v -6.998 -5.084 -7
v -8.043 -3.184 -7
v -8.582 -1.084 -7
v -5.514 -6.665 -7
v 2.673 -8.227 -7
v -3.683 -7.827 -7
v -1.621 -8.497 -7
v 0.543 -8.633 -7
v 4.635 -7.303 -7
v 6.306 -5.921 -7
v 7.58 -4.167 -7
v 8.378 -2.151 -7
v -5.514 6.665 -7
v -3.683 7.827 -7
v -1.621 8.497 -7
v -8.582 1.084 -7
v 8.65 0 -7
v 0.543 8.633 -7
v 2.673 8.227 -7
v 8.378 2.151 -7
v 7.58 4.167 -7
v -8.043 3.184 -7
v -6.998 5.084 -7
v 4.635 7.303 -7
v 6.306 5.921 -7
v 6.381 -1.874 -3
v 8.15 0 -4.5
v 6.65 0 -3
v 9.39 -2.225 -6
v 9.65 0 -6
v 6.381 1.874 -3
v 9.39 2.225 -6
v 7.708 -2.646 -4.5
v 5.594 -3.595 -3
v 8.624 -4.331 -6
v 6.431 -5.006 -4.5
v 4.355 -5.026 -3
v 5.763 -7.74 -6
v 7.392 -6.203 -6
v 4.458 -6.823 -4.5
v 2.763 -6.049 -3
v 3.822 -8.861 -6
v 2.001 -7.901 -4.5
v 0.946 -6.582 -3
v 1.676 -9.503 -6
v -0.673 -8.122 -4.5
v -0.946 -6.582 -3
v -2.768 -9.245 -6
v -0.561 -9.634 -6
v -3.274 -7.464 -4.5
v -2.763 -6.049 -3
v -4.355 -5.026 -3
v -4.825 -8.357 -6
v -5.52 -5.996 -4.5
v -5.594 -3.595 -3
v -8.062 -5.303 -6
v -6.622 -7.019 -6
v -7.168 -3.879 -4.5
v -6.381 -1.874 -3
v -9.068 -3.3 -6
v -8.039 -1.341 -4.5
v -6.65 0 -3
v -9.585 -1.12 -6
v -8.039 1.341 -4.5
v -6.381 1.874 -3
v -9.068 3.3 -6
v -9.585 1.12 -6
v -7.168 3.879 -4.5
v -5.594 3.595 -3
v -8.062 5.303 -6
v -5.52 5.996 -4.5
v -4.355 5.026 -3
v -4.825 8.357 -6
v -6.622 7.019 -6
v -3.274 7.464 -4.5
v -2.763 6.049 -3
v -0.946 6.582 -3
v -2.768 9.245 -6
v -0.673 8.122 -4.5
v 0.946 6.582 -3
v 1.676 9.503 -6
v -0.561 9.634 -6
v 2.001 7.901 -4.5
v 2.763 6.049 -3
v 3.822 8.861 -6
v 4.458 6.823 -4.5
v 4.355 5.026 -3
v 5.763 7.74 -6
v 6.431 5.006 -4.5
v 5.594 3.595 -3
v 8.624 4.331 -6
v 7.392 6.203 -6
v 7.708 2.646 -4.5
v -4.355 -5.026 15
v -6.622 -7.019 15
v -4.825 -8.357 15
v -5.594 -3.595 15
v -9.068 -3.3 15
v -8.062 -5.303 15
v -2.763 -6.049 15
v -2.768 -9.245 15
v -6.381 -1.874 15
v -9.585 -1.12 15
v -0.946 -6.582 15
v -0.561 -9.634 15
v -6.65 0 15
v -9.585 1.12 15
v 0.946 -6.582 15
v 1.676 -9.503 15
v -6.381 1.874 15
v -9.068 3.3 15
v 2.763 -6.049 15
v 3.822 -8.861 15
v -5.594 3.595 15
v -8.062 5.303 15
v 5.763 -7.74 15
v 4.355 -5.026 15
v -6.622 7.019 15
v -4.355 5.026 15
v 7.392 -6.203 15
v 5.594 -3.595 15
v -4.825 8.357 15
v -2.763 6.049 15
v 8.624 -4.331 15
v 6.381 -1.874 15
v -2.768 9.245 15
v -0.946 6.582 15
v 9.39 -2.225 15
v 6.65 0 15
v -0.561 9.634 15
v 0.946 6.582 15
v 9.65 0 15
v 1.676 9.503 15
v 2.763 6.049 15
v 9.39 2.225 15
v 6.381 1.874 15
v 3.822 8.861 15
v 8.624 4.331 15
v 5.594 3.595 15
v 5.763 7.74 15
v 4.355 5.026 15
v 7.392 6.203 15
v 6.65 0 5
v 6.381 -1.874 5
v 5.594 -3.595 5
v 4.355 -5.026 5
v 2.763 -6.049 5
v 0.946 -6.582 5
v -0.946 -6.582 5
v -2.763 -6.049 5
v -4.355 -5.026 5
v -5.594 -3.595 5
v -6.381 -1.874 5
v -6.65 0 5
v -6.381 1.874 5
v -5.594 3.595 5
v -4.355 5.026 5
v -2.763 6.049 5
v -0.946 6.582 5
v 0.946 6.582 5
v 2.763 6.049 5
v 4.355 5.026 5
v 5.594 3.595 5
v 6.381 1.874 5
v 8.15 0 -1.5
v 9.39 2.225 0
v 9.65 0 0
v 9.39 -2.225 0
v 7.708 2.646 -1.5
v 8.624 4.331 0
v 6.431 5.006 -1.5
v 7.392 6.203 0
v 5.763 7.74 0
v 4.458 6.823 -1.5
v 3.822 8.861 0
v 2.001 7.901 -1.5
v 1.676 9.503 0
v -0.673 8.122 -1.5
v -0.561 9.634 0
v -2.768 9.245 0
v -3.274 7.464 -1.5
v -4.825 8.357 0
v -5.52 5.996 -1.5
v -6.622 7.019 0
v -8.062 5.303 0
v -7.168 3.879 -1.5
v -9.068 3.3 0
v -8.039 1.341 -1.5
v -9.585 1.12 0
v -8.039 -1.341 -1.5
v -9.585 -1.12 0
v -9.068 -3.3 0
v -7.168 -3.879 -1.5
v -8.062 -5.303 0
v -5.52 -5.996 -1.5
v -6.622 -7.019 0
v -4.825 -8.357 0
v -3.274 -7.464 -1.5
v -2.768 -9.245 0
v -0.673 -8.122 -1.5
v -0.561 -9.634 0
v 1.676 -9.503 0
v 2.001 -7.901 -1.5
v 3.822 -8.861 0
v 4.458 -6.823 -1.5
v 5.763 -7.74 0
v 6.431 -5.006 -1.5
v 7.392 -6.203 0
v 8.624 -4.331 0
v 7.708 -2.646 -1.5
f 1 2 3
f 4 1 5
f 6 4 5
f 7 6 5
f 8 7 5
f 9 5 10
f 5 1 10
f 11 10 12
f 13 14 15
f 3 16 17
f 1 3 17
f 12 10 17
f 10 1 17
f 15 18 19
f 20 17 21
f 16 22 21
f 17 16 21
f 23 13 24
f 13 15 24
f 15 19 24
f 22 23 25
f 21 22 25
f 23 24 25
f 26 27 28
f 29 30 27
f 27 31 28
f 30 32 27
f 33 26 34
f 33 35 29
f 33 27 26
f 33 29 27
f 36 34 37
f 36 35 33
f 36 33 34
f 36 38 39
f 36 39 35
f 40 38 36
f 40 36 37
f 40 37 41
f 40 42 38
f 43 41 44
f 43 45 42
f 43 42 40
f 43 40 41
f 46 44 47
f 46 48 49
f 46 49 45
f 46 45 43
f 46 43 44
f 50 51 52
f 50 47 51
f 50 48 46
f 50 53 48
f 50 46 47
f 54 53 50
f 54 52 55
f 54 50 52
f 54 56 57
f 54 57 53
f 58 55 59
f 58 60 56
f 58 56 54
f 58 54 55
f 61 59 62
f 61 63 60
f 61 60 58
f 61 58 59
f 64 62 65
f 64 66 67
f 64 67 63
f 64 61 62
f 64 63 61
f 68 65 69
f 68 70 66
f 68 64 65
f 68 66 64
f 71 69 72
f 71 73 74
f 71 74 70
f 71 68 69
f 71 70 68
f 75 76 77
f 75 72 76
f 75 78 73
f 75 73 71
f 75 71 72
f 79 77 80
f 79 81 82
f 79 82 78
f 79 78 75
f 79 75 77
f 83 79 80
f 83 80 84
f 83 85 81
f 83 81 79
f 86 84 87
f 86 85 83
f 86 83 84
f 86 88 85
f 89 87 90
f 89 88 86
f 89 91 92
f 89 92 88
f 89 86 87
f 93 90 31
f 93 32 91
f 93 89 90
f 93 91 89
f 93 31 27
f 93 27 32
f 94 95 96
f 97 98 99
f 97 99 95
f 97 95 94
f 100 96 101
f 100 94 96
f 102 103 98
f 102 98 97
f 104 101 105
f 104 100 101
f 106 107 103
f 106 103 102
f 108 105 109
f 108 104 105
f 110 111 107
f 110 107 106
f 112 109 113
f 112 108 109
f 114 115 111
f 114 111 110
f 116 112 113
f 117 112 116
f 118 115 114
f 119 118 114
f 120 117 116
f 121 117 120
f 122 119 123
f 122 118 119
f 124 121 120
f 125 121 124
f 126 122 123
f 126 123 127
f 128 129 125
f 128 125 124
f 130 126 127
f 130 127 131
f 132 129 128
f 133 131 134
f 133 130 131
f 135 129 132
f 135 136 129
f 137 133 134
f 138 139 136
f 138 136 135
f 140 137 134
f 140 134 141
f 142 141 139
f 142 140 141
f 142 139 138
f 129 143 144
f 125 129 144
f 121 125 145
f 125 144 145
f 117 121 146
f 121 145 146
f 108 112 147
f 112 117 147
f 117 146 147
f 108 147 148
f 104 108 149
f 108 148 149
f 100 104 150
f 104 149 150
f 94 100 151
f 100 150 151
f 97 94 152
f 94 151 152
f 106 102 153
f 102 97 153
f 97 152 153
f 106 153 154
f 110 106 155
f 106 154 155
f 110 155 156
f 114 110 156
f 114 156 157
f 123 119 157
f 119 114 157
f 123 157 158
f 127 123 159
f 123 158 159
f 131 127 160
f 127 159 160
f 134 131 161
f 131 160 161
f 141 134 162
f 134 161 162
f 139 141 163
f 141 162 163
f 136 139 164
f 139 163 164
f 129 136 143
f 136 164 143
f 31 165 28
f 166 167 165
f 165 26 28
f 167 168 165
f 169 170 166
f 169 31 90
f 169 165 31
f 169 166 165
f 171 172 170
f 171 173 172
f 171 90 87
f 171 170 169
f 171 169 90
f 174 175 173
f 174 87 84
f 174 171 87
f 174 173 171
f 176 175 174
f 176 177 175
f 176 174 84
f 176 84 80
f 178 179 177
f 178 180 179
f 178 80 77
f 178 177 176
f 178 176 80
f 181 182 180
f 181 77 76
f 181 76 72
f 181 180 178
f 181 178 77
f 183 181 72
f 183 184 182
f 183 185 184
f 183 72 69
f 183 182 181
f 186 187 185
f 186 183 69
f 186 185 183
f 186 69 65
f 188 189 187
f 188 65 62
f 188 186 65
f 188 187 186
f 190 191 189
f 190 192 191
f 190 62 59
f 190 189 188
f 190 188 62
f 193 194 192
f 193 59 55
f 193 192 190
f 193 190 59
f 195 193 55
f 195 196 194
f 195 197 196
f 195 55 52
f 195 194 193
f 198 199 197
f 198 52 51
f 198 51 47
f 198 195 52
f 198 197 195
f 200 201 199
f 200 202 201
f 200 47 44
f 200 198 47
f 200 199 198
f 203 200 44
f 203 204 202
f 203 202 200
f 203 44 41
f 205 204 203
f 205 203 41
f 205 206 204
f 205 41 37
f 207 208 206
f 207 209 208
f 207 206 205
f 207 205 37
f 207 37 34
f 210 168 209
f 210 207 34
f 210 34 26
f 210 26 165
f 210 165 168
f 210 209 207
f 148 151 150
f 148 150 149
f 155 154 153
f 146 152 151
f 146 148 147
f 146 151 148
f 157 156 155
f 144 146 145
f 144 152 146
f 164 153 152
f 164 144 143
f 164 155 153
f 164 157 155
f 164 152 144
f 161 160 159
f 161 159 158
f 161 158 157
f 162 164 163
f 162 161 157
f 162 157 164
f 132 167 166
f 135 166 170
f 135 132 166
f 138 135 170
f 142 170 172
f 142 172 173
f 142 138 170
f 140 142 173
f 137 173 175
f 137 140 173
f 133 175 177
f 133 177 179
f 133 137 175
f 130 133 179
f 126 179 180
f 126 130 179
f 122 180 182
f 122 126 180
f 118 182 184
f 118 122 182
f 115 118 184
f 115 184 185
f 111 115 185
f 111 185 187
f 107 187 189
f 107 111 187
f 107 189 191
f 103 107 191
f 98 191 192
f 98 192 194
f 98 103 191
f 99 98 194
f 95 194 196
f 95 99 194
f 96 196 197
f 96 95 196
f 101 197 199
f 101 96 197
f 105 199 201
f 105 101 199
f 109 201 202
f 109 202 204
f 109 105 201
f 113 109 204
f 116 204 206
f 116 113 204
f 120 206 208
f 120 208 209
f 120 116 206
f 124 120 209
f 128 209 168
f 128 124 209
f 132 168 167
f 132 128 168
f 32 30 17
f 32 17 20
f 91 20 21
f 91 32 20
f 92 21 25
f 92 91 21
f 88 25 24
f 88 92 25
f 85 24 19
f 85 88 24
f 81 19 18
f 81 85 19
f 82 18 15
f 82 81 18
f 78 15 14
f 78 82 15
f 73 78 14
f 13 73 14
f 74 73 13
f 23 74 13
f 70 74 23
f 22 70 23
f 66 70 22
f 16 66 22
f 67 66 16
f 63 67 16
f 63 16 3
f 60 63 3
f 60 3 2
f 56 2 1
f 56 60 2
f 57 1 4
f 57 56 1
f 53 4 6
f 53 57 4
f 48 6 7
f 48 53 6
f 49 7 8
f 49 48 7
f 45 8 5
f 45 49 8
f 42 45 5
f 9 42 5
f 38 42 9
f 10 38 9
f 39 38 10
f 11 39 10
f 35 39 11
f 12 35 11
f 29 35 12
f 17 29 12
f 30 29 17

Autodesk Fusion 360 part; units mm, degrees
sketch "Sketch1" plane through (0, 0, 0) normal (0, 0, 1) x (1, 0, 0)
  circle A0 centre (0, 0) radius 6.65
  circle A1 centre (0, 0) radius 9.65
  dimension "d1" = 13.3
  dimension "d2" = 3
extrude "Extrude1" add sketch "Sketch1" along normal blind 15
extrude "Extrude2" add sketch "Sketch1" along normal blind 5 contours A0
sketch "Sketch2" plane through (0, 0, 0) normal (0, 0, 1) x (1, 0, 0)
  circle A0 centre (0, 0) radius 9.65
  dimension "d7" = 19.3
extrude "Extrude3" add sketch "Sketch2" against normal blind 7
sketch "Sketch3" plane through (0, 0, -7) normal (0, 0, -1) x (1, 0, 0)
  circle A0 centre (0, 0) radius 9.65
  circle A1 centre (0, 0) radius 5
  dimension "d10" = 10
chamfer "Chamfer1" distance 1 angle 45 1 edges at (-8.997, 3.4896, -7)
sketch "Sketch4" plane through (0, 0, 0) normal (0, 1, 0) x (1, 0, 0)
  line L0 (9.65, 6) -> (-9.65, 6)
  line L1 (9.65, 6) -> (9.65, 0)
  line L2 (9.65, 0) -> (6.65, 3)
  line L3 (6.65, 3) -> (9.65, 6)
  line L4 (0, 0) -> (9.65, 0)
  dimension "d18" = 45
revolve "Revolve1" cut sketch "Sketch4" angle 360 about axis through (0, 0, 1.75) along (0, 0, 1)
